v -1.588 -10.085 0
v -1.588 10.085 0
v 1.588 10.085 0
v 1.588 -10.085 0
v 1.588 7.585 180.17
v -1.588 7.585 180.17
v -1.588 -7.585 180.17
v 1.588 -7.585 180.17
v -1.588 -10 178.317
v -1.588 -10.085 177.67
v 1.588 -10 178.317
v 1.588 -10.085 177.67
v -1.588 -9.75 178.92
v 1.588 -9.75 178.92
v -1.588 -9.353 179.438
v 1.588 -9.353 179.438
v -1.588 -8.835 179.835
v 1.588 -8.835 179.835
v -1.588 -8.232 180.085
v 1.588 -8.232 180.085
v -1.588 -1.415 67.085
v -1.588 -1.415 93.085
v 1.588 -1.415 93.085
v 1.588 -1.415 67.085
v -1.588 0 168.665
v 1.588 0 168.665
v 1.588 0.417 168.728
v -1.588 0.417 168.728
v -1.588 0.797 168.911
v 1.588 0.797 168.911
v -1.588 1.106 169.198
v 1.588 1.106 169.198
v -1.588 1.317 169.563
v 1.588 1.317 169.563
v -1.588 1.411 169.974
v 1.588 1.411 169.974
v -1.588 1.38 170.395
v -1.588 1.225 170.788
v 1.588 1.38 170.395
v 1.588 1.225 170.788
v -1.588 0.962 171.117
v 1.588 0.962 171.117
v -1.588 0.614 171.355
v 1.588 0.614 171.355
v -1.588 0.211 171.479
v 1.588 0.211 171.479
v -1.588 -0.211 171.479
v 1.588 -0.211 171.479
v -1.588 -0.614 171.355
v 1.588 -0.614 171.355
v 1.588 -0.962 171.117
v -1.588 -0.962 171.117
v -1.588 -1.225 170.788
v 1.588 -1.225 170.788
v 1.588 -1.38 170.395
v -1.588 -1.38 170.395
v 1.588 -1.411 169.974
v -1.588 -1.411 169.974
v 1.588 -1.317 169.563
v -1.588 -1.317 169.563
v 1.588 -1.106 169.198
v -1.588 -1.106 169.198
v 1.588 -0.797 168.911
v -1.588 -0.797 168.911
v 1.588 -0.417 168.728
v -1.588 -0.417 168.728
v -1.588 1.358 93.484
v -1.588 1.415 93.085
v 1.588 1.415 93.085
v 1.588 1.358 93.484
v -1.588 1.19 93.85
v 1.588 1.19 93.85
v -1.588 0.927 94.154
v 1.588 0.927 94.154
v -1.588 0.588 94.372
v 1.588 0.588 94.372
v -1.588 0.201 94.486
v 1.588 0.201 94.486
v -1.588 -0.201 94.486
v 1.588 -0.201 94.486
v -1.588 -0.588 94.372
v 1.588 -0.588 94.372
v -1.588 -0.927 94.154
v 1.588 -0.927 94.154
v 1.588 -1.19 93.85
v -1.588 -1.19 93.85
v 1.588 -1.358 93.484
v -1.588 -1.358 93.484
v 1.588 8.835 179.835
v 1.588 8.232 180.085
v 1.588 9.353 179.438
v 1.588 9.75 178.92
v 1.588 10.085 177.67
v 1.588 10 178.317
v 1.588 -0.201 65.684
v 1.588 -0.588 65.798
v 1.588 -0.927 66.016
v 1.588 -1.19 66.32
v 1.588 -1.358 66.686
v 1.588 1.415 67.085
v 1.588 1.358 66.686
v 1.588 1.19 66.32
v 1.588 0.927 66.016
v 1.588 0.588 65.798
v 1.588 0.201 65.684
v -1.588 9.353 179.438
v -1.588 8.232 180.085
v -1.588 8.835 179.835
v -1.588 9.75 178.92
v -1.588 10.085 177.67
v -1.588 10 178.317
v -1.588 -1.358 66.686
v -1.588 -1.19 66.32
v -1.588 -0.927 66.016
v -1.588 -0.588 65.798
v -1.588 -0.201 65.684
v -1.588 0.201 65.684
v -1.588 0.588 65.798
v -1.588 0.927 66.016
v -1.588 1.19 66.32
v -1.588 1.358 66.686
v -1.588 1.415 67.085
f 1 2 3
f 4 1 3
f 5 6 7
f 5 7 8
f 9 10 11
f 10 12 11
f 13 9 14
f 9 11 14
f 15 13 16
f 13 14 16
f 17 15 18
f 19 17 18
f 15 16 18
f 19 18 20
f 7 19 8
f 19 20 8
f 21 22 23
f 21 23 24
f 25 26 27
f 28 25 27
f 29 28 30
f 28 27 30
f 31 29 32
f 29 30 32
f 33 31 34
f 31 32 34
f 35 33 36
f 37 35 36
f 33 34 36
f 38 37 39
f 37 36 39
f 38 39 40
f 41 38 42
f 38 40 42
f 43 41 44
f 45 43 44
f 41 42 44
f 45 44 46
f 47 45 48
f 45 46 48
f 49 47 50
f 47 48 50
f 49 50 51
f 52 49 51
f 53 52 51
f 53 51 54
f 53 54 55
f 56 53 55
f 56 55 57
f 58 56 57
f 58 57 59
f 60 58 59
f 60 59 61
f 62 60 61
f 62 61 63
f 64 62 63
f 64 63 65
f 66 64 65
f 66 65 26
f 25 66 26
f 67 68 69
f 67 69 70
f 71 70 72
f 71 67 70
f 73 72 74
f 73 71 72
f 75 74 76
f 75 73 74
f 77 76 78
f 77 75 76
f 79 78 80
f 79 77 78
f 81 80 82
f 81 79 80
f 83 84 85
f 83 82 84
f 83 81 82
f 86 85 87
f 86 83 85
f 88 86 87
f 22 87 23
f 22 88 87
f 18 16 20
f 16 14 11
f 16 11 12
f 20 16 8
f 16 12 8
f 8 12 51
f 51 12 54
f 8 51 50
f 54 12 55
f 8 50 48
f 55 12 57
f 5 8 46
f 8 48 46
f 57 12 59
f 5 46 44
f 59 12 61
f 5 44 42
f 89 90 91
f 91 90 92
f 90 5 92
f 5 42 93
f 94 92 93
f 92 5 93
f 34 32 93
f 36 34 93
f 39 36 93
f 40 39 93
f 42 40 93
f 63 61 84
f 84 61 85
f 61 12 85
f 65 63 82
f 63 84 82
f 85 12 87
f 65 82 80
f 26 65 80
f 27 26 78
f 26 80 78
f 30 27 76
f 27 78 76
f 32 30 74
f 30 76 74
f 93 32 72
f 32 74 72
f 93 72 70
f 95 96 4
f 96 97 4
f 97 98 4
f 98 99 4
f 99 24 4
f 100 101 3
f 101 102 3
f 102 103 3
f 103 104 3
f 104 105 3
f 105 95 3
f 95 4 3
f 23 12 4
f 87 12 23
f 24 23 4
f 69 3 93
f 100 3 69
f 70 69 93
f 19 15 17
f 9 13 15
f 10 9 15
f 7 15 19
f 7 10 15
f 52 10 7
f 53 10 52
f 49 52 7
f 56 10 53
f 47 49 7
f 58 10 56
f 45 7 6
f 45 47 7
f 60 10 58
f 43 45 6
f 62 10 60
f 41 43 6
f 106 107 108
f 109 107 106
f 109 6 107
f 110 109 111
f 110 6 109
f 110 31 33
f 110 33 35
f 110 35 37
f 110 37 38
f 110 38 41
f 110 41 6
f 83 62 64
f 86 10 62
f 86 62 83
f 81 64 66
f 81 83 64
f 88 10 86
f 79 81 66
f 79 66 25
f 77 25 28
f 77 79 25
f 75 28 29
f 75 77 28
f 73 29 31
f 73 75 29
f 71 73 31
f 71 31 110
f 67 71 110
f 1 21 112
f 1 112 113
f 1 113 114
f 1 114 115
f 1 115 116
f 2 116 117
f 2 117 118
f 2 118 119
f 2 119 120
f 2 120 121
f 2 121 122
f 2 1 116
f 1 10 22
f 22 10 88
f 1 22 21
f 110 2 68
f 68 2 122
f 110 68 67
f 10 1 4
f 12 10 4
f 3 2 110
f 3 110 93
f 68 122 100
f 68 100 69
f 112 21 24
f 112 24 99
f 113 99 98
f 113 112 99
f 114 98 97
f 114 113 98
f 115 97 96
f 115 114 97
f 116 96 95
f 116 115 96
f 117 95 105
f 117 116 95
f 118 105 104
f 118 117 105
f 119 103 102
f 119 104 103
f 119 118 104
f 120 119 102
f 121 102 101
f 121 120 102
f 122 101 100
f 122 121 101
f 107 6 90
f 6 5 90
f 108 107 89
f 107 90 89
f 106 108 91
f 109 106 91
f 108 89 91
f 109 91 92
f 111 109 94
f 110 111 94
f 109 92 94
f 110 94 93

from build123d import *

# Parameters (mm, degrees)
SKETCH1_W           = 3.175
SKETCH1_H           = 20.17
BOSS_EXTRUDE1_DEPTH = 180.17
SKETCH6_R           = 1.415
CUT_EXTRUDE1_DEPTH  = 4.175
FILLET1_R           = 2.5
CUT_EXTRUDE3_DEPTH  = 10


with BuildPart() as part:
    # Sketch1 → Boss-Extrude1 (new body)
    with BuildSketch(Plane.XY):
        Rectangle(SKETCH1_W, SKETCH1_H)
    extrude(amount=BOSS_EXTRUDE1_DEPTH)

    # Sketch6 → Cut-Extrude1 (cut, through all)
    with BuildSketch(Plane(origin=(1.5875, 0, 0), x_dir=(0, 0, -1), z_dir=(1, 0, 0))):
        with Locations((-170.08, 0)):
            Circle(SKETCH6_R)
    extrude(amount=-CUT_EXTRUDE1_DEPTH, mode=Mode.SUBTRACT)

    # Fillet1
    fillet1_edges = [part.edges().sort_by_distance(p)[0] for p in [
        (0, -10.085, 180.17),
        (0, 10.085, 180.17),
    ]]
    fillet(fillet1_edges, radius=FILLET1_R)

    # Sketch7 → Cut-Extrude3 (cut)
    with BuildSketch(Plane.ZY.offset(1.5875)):
        with BuildLine():
            Line((67.085, 1.415), (93.085, 1.415))
            ThreePointArc((93.085, 1.415), (94.5, 0), (93.085, -1.415))
            Line((93.085, -1.415), (67.085, -1.415))
            ThreePointArc((67.085, -1.415), (65.67, 0), (67.085, 1.415))
        make_face()
    extrude(amount=-CUT_EXTRUDE3_DEPTH, mode=Mode.SUBTRACT)


solid = part.part
